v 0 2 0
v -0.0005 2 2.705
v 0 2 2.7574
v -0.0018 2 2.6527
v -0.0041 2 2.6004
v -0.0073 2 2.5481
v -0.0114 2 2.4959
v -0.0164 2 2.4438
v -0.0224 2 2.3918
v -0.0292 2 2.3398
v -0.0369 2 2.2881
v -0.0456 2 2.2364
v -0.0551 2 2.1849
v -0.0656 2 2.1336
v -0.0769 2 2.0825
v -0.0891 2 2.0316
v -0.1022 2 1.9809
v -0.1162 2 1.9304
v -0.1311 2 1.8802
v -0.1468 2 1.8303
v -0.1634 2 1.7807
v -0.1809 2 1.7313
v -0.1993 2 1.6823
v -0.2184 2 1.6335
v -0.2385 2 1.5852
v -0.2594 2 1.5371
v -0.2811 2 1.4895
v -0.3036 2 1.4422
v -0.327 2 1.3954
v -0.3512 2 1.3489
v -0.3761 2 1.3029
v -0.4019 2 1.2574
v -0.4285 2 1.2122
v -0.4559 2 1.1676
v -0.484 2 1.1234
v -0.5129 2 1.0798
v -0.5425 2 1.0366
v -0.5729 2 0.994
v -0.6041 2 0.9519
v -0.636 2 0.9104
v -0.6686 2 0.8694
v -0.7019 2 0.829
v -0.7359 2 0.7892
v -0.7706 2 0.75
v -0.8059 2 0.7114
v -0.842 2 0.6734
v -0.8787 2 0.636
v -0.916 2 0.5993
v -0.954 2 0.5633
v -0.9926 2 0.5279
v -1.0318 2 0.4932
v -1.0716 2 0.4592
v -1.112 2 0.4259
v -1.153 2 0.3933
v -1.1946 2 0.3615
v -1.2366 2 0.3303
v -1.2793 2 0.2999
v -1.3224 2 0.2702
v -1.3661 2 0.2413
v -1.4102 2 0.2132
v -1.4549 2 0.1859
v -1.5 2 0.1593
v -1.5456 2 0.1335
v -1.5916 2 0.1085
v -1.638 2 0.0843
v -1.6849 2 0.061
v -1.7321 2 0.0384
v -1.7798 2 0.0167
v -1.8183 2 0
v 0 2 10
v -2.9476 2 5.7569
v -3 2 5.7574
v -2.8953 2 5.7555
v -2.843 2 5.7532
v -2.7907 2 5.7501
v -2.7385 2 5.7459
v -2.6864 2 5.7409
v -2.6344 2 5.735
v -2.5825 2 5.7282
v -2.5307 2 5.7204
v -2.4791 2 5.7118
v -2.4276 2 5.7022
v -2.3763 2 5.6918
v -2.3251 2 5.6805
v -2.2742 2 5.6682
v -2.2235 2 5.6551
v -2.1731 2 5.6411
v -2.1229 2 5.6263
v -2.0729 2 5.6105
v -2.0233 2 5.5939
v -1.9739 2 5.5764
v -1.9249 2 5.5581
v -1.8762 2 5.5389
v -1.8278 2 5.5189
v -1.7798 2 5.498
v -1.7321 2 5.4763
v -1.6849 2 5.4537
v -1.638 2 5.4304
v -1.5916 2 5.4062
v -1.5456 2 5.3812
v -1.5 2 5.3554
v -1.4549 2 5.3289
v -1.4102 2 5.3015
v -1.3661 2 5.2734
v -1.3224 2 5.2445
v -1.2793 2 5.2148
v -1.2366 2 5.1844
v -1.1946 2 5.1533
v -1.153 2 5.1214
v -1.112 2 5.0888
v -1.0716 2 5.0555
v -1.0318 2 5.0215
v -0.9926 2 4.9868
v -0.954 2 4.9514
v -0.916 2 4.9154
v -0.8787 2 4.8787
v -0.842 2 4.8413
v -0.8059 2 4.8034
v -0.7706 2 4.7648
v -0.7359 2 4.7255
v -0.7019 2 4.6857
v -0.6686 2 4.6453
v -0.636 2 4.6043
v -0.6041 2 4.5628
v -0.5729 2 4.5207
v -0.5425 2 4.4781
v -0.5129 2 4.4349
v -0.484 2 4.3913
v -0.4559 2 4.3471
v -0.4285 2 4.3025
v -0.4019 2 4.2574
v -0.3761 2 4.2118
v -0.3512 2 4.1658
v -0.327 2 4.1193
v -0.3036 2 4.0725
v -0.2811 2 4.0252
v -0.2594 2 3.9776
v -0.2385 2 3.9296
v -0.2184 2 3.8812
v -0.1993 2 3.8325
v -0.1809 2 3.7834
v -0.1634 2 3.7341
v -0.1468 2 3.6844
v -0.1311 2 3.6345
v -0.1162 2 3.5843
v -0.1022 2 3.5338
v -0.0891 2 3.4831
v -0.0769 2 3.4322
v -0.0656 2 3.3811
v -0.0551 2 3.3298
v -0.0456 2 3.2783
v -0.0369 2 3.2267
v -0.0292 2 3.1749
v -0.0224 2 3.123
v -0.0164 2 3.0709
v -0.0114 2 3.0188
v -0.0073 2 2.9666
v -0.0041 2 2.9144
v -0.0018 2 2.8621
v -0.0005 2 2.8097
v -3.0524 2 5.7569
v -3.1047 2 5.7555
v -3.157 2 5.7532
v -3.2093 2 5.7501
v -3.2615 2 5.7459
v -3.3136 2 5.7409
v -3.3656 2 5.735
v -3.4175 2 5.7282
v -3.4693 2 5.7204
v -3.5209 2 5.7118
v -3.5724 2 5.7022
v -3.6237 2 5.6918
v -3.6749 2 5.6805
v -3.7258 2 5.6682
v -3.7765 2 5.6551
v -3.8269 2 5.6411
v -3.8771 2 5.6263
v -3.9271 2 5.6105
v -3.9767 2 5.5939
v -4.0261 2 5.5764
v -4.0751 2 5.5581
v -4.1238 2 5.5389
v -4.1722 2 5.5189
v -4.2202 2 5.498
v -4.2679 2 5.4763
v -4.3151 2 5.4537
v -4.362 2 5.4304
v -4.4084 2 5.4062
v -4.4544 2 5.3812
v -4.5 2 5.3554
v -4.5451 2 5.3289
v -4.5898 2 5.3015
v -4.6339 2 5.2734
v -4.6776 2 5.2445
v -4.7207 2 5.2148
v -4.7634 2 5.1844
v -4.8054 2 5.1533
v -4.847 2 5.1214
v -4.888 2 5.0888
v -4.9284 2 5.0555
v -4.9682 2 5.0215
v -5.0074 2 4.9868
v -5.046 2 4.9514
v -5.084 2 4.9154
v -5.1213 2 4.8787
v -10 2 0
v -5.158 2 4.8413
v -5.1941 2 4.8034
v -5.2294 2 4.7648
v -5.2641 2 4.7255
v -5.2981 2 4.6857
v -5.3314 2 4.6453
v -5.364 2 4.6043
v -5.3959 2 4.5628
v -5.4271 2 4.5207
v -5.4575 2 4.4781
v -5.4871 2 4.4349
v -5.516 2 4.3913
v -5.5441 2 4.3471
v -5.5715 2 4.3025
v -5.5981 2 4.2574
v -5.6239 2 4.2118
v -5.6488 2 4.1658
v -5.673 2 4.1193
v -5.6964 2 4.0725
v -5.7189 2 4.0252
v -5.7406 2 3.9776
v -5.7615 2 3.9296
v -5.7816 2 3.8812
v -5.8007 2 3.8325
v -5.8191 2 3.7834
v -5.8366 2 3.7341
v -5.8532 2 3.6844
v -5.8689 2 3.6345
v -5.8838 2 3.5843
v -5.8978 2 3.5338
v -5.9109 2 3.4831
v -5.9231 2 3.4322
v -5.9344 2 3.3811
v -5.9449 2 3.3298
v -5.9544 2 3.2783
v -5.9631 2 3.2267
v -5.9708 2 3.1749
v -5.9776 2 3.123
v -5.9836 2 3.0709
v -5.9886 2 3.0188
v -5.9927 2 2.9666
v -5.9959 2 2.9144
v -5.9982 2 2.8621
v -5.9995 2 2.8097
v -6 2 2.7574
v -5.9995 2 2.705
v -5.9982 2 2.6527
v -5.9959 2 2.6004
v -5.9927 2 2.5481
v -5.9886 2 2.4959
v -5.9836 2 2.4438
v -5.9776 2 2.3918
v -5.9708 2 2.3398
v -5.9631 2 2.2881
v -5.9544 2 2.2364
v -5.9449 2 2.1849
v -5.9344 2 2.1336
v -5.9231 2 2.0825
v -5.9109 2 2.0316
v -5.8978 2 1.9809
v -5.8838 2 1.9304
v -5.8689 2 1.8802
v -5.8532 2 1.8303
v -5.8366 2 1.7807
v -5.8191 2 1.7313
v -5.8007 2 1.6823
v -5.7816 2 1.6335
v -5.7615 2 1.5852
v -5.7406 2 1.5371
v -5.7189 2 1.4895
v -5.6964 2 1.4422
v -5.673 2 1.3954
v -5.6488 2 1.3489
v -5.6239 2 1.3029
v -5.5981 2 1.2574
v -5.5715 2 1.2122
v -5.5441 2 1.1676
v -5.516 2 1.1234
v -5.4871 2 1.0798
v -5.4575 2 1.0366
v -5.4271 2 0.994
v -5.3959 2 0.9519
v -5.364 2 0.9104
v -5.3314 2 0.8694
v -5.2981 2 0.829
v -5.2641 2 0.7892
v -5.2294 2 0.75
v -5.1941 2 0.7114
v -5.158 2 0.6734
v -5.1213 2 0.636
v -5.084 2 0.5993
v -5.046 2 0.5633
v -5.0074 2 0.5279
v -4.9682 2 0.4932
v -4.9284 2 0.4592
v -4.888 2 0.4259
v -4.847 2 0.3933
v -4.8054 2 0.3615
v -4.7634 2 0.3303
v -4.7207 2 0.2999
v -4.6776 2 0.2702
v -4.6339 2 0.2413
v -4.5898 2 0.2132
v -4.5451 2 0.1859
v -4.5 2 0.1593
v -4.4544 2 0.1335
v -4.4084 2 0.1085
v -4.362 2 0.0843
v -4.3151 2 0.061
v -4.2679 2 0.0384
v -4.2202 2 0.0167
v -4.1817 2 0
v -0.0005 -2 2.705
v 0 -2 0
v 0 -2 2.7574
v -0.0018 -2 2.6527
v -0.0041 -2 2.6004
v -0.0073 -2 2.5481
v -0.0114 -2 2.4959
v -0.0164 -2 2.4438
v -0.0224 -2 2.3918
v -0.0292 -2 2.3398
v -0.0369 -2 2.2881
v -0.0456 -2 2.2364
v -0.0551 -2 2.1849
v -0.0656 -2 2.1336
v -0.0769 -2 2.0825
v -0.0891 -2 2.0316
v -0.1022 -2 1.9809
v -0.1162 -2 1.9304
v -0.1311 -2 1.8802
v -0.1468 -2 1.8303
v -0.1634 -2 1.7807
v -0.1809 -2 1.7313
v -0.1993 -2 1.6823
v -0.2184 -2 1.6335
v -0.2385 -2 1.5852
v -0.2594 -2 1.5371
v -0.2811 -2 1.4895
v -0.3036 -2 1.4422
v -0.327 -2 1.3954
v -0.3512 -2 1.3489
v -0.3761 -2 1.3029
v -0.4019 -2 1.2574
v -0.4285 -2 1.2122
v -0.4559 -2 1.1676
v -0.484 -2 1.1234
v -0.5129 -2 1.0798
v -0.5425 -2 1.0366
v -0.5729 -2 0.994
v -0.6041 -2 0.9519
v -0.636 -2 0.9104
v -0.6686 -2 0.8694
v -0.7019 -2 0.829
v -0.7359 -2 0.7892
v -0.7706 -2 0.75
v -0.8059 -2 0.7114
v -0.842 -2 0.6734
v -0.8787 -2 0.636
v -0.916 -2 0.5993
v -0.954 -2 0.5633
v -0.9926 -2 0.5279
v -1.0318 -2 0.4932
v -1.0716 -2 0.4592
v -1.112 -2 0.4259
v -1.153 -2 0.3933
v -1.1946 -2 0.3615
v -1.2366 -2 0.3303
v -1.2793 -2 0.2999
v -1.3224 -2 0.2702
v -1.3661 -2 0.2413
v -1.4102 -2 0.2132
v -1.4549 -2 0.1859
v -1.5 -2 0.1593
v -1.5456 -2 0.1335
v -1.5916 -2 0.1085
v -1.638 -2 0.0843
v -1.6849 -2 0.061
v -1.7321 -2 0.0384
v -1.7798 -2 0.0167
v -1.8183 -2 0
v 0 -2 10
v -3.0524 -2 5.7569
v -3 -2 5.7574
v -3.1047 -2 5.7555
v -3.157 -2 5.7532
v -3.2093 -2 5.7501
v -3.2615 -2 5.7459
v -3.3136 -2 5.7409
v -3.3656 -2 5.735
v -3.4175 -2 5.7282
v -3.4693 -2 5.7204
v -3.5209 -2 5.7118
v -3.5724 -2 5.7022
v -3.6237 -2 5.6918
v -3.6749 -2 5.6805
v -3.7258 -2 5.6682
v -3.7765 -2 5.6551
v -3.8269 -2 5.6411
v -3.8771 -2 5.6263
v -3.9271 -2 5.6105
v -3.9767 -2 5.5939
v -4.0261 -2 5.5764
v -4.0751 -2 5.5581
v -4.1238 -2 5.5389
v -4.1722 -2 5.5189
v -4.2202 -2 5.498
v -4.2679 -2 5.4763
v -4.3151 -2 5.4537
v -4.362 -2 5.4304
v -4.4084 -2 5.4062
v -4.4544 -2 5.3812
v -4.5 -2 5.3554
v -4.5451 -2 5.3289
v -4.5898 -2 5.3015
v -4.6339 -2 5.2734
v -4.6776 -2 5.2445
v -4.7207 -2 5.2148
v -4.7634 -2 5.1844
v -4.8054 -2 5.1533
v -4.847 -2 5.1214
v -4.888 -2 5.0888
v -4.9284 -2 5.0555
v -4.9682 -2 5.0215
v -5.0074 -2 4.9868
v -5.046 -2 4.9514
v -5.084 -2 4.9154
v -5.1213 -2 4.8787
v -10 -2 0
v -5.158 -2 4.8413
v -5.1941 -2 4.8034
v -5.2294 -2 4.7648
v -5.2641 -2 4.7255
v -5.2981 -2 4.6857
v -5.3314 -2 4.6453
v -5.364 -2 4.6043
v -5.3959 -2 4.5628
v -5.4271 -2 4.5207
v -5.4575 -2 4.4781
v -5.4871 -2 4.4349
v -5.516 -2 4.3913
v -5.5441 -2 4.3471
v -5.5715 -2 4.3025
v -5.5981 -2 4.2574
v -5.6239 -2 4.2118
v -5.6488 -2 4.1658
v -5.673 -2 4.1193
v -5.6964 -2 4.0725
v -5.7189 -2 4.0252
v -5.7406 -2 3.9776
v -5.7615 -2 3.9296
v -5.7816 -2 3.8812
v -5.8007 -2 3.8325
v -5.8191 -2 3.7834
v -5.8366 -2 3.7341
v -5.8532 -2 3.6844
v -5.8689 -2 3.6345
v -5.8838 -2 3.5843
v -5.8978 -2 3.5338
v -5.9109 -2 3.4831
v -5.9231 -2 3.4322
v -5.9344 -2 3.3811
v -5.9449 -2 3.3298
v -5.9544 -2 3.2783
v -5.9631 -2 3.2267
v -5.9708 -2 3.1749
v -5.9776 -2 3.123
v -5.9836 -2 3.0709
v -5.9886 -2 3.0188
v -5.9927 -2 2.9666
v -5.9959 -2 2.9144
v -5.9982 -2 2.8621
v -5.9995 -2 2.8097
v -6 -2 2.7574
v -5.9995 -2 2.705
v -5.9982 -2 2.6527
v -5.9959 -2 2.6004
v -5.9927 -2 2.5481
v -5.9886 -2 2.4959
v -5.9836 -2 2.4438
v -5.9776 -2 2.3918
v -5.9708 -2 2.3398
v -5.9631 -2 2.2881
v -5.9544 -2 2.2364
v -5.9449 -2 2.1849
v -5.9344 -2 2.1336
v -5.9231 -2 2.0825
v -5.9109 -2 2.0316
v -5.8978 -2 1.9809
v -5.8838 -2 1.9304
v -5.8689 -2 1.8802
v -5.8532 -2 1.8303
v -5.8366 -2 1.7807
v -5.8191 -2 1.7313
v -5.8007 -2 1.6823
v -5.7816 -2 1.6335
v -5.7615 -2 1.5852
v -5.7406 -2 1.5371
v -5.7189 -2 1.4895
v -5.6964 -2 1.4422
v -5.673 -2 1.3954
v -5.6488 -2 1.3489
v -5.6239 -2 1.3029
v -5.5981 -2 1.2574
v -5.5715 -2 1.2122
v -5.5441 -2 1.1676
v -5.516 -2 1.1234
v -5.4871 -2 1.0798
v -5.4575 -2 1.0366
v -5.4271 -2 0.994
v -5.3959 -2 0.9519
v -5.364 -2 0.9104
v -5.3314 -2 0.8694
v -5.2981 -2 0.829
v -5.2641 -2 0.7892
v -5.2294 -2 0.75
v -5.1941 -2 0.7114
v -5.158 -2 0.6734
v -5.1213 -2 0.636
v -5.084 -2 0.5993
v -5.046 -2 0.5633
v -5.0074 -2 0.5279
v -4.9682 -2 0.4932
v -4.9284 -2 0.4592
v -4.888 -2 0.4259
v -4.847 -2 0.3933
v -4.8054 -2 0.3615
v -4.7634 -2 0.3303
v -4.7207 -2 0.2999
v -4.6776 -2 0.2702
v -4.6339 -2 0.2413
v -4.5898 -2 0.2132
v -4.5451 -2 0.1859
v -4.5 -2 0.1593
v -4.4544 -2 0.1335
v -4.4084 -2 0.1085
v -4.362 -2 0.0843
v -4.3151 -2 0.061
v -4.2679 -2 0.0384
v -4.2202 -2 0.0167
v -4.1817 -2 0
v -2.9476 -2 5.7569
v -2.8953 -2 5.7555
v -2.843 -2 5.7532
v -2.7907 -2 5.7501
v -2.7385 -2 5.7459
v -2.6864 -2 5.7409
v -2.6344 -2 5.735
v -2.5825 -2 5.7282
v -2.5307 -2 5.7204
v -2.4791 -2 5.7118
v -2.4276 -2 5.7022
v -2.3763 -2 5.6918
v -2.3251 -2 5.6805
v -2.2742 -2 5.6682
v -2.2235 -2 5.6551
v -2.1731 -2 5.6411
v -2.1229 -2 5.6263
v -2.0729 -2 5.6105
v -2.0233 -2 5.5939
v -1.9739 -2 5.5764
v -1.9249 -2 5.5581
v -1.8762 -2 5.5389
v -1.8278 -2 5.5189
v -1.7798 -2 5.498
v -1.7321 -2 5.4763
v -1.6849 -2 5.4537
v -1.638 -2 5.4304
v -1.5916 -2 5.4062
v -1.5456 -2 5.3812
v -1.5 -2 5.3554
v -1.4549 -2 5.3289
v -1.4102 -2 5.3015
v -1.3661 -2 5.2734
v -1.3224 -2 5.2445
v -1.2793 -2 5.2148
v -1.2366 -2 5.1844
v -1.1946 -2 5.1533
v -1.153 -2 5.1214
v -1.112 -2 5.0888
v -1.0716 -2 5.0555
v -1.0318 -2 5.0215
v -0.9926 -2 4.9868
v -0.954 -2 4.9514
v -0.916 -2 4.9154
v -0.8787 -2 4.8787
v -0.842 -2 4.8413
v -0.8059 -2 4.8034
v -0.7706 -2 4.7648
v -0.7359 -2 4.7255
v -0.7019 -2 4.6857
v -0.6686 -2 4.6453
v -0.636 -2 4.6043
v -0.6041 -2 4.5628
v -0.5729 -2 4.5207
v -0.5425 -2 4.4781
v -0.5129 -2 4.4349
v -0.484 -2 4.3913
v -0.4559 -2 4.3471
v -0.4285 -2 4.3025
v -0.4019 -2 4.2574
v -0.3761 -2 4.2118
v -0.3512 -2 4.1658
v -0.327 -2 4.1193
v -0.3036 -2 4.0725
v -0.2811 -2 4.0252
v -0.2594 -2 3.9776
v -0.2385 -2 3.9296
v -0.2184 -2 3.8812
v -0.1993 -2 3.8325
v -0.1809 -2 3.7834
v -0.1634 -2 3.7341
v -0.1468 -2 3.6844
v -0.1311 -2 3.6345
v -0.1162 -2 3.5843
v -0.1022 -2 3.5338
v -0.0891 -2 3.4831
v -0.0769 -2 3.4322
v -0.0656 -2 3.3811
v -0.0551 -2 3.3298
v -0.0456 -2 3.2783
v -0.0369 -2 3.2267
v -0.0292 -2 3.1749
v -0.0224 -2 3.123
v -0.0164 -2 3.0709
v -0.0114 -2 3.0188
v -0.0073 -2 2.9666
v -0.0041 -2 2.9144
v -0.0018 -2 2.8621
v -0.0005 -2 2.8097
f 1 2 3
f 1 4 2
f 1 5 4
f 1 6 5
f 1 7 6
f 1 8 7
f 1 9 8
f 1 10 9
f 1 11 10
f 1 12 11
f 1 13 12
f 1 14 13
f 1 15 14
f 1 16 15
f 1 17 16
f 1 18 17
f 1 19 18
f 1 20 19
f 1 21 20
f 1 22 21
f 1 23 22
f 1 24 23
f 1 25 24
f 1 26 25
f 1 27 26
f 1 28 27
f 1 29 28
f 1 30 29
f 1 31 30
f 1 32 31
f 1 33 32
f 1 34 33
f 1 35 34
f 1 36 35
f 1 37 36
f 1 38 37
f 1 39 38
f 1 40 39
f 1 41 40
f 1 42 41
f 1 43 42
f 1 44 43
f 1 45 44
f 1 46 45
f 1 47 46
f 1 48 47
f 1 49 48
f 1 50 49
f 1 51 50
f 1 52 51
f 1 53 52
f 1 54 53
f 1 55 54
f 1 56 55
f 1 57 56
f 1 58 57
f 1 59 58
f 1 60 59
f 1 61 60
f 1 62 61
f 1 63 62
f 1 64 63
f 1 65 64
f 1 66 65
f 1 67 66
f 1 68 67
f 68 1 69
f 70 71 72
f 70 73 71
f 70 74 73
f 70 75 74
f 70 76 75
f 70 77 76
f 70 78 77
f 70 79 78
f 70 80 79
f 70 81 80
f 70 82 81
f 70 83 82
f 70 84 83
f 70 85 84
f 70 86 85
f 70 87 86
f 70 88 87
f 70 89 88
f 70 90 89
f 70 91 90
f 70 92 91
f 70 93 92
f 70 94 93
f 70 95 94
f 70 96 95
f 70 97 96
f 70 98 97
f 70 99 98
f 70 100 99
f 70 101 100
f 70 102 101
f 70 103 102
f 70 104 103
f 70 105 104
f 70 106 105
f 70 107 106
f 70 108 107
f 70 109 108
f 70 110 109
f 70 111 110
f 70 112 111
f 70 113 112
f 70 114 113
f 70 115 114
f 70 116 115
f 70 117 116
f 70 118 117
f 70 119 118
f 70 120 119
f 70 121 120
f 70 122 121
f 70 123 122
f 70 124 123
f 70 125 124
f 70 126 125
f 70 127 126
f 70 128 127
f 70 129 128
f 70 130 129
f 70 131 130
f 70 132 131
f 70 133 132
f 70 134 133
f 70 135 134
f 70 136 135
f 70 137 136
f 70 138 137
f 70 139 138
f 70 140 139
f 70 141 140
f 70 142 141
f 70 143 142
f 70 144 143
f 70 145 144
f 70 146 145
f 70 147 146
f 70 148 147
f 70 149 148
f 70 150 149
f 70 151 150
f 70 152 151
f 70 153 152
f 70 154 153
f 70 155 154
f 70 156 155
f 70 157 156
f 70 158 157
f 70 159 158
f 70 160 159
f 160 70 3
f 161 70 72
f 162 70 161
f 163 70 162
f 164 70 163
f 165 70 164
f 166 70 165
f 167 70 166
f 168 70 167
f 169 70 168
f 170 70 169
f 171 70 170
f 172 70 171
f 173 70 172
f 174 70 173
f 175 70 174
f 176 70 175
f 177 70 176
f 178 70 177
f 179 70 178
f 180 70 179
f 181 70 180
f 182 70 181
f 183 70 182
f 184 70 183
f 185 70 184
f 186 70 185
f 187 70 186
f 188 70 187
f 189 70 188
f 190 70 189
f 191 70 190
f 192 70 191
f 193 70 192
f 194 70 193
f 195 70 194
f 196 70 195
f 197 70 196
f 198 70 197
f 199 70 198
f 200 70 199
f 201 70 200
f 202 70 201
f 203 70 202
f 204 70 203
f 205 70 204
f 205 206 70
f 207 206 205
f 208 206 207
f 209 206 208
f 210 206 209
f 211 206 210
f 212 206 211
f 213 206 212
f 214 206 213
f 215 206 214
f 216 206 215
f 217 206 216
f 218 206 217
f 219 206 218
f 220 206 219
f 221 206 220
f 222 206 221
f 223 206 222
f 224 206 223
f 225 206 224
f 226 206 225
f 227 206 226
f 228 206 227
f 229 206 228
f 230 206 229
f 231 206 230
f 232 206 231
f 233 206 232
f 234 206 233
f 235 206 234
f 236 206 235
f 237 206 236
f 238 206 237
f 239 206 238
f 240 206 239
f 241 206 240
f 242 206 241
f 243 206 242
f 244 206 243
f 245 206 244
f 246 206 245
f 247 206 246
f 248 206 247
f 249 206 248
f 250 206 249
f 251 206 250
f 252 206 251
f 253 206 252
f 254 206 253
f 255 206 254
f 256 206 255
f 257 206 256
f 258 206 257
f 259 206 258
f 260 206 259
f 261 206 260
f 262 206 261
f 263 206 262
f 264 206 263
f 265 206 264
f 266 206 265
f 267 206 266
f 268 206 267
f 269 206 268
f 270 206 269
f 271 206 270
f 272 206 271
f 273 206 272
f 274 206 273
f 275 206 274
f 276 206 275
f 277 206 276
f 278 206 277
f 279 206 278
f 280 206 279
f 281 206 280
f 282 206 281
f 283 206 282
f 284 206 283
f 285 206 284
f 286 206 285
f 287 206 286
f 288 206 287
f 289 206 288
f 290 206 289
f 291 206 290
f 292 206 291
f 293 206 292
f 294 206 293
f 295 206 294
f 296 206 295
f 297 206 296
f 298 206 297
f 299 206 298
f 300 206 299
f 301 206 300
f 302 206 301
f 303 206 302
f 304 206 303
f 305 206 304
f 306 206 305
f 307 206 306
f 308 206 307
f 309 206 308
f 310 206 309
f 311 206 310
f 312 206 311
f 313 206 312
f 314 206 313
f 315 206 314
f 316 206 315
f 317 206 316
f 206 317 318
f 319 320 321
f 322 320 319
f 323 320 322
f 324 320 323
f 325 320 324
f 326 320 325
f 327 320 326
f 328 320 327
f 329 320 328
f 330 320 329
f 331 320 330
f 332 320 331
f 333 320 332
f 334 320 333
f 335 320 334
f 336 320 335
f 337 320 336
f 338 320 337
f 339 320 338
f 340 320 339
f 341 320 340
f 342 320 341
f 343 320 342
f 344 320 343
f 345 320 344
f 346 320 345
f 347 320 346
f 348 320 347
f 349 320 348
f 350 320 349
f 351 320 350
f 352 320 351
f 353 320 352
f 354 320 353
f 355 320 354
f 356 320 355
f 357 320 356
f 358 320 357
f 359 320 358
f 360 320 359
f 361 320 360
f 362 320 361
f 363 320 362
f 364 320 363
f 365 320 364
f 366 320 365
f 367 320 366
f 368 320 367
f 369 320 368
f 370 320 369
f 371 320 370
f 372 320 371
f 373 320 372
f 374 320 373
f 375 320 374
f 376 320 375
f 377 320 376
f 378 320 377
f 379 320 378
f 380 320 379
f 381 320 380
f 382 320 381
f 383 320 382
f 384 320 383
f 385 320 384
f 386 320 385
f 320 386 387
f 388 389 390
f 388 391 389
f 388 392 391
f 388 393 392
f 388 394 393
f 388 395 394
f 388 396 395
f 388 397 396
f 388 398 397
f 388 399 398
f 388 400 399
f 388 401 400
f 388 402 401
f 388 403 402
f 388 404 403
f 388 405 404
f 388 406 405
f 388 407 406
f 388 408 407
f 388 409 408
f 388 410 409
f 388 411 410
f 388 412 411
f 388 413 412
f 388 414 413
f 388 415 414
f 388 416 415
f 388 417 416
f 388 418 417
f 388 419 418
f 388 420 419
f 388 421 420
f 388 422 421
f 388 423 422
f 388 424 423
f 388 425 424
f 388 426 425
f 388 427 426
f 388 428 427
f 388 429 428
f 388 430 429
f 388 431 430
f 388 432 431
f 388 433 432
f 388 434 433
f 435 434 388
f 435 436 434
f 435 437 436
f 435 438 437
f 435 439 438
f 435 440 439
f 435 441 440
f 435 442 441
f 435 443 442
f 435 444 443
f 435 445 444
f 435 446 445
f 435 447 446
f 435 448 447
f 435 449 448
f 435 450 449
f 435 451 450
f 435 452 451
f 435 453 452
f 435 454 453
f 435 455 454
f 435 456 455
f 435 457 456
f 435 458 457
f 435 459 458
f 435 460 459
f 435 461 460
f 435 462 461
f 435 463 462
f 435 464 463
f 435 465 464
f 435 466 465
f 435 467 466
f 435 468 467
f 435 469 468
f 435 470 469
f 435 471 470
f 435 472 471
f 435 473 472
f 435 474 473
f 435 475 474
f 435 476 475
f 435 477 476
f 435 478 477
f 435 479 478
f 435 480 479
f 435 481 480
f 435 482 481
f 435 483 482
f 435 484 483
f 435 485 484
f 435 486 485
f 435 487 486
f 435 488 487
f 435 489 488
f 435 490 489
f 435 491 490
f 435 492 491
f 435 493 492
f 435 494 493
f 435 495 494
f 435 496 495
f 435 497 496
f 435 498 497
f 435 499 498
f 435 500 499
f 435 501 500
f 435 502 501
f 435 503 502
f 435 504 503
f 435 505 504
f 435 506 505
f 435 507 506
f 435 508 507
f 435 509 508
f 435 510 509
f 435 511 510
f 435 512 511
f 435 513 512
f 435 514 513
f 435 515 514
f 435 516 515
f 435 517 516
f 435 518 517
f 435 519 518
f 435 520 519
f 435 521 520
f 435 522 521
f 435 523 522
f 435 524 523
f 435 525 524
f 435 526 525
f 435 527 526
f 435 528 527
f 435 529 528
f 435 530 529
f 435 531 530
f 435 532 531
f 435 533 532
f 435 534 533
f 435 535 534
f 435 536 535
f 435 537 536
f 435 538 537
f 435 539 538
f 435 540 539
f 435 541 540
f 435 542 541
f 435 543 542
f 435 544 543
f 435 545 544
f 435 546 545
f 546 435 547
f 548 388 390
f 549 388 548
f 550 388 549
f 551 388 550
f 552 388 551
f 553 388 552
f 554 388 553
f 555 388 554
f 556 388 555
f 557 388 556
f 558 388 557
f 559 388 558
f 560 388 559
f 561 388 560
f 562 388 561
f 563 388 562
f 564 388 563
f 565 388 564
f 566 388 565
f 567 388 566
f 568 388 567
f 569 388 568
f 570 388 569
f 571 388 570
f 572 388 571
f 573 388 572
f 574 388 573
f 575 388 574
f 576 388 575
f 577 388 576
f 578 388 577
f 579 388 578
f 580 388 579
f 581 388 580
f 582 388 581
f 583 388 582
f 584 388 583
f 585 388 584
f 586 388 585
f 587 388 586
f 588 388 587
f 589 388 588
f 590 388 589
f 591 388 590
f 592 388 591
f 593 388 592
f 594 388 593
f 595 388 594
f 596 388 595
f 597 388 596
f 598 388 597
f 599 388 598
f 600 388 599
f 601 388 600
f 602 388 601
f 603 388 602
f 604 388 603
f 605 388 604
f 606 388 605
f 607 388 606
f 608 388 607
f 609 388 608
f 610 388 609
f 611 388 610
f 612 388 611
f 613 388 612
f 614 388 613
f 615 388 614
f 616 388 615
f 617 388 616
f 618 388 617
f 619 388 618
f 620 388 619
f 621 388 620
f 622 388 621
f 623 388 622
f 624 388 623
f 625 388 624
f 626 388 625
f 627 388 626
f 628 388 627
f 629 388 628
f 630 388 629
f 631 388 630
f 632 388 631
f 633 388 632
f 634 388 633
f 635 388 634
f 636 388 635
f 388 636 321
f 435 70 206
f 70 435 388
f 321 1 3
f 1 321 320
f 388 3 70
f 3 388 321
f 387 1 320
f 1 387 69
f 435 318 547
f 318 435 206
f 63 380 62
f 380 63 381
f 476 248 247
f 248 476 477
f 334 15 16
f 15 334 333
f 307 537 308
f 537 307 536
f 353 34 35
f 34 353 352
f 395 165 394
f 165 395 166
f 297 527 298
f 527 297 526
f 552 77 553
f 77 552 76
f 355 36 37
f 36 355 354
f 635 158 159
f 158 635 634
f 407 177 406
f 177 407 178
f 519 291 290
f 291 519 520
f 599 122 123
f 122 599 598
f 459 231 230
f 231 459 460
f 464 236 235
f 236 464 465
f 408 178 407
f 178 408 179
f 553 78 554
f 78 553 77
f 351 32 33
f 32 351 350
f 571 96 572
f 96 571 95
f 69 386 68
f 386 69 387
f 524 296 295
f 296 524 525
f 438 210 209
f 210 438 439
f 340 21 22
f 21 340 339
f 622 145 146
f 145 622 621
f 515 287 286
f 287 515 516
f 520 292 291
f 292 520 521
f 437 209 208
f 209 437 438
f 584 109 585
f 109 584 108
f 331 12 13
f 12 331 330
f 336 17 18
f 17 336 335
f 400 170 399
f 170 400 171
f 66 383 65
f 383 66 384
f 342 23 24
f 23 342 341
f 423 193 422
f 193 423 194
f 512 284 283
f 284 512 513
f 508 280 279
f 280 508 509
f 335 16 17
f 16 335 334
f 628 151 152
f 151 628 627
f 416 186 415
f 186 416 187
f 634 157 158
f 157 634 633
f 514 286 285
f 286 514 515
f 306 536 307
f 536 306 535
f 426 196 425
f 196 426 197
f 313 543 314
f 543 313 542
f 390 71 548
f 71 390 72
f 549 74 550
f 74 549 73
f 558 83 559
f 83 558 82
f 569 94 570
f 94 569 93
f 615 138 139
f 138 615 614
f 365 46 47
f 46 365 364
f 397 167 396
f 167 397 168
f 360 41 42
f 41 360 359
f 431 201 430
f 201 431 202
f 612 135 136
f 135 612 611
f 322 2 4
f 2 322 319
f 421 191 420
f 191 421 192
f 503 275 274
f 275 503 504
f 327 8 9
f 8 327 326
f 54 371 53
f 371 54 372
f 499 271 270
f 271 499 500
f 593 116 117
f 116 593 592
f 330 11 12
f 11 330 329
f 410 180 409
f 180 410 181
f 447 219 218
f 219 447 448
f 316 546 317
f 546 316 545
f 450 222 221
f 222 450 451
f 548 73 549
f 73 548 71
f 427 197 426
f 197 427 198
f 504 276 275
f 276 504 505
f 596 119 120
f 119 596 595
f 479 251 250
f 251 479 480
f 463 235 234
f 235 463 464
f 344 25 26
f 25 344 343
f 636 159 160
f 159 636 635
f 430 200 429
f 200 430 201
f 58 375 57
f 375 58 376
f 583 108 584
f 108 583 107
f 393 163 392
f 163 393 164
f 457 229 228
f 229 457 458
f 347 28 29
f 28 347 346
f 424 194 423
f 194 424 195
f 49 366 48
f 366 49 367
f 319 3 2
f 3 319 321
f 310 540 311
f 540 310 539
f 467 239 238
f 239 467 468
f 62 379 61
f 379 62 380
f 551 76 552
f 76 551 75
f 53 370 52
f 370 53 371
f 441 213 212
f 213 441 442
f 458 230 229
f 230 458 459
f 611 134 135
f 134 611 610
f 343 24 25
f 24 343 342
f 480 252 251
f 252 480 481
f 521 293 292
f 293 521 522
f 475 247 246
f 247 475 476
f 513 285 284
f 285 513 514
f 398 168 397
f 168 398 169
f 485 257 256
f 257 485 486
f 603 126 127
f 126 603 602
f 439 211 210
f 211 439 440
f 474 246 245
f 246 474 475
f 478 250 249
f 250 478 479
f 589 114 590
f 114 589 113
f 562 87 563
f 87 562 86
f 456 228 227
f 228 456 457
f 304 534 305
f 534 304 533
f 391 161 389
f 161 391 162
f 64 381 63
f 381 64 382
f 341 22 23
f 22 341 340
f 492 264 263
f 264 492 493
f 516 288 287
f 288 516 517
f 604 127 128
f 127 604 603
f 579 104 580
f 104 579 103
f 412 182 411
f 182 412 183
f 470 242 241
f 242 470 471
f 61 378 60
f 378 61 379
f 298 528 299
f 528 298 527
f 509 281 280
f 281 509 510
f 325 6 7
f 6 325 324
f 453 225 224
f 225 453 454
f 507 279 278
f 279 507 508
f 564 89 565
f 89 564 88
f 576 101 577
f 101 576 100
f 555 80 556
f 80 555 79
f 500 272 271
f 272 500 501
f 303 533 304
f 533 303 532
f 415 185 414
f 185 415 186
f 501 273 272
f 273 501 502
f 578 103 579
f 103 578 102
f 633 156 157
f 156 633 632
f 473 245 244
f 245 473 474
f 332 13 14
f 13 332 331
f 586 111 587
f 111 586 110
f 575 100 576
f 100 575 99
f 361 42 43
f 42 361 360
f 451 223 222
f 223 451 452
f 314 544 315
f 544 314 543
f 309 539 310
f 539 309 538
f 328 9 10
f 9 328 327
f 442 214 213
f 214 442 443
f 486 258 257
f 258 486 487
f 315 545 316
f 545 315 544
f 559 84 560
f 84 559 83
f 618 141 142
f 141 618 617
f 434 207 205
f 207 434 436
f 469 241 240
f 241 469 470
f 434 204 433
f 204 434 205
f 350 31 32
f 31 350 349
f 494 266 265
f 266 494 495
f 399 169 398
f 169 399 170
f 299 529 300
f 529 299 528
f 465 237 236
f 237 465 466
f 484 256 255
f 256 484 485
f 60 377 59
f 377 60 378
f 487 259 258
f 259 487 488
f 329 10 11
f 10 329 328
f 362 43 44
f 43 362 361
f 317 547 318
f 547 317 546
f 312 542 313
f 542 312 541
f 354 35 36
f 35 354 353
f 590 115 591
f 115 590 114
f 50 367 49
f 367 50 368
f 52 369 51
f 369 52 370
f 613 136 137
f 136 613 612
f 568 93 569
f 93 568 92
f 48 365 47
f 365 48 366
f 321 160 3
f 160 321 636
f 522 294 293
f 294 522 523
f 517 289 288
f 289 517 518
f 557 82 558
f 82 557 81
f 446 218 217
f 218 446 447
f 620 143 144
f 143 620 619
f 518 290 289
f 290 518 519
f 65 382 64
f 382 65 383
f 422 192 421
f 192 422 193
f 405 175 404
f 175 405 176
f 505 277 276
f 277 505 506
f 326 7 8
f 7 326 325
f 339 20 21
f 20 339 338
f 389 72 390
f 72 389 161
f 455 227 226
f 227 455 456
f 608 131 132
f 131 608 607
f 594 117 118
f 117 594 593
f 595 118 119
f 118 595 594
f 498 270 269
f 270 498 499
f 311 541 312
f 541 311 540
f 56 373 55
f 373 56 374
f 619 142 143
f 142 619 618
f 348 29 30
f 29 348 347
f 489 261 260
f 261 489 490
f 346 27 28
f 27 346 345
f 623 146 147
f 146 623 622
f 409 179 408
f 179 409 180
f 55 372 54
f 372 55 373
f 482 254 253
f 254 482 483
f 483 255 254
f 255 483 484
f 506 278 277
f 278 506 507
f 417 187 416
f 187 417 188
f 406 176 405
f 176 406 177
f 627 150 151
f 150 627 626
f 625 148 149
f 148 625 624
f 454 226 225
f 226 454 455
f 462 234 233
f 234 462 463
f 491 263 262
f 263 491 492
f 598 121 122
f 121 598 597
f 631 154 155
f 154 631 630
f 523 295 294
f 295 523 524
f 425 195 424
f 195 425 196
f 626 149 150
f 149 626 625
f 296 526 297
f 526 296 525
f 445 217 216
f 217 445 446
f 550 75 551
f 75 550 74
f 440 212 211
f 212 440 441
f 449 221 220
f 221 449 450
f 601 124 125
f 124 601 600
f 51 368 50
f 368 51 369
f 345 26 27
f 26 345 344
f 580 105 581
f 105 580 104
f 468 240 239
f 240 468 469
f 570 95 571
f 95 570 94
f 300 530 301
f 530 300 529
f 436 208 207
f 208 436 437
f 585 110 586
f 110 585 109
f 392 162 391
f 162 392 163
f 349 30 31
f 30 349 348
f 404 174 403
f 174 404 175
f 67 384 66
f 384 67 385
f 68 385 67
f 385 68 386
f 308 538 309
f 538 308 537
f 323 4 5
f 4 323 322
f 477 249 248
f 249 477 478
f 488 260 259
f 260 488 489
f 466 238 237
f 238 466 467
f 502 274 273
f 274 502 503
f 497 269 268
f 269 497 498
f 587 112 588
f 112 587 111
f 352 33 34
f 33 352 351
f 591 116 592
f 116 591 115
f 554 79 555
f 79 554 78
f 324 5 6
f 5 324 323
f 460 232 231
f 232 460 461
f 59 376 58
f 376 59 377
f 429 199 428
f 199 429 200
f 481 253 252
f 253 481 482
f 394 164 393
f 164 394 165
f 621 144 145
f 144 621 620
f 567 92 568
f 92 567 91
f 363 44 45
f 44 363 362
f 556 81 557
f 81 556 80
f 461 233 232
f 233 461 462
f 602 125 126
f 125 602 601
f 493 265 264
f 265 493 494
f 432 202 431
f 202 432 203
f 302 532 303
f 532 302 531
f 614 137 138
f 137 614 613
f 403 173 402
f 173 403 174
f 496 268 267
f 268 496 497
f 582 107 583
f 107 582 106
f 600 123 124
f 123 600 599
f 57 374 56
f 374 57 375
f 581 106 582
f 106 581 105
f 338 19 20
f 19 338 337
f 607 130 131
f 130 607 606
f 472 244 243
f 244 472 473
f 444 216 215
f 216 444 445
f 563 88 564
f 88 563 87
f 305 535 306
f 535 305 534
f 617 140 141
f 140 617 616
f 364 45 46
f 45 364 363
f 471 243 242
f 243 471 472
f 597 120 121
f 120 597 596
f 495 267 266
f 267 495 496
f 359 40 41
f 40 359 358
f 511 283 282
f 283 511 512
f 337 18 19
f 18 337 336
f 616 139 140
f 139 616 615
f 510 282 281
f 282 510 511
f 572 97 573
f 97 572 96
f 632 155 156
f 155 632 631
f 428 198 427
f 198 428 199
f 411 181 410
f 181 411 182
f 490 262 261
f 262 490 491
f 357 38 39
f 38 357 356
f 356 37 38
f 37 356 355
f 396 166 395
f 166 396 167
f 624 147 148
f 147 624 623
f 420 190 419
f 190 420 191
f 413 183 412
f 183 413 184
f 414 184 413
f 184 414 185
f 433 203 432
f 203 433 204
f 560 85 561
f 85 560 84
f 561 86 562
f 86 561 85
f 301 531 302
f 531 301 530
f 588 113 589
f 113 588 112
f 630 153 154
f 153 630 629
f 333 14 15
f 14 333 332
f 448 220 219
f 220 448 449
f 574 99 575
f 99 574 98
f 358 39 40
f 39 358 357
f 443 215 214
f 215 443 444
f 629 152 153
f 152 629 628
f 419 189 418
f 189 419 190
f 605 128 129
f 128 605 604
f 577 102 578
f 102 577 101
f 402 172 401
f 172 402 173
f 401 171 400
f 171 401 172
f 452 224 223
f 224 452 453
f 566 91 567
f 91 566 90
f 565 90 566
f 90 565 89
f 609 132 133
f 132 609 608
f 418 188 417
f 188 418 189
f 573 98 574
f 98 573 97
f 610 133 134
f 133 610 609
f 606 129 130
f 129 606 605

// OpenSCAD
pad = 0.1;	// Padding to maintain manifold
b = 10;
h = 10;
w = 4;
r = 3;	// Radius of round
smooth = 360;	// Number of facets of rounding cylinder

z = h - r*h/b - r*pow(pow(h,2)+pow(b,2),0.5)/b;

difference() {
	rotate(a=[90,-90,0])
		linear_extrude(height = w, center = true, convexity = 10, twist = 0)
			polygon(points=[[0,0],[h,0],[0,b]], paths=[[0,1,2]]);
	translate([0,0,z])
		translate([-r,0,0])
			rotate(a=[0,90,90])
				cylinder(w+4*pad,r,r,center=true,$fn=smooth);
}
